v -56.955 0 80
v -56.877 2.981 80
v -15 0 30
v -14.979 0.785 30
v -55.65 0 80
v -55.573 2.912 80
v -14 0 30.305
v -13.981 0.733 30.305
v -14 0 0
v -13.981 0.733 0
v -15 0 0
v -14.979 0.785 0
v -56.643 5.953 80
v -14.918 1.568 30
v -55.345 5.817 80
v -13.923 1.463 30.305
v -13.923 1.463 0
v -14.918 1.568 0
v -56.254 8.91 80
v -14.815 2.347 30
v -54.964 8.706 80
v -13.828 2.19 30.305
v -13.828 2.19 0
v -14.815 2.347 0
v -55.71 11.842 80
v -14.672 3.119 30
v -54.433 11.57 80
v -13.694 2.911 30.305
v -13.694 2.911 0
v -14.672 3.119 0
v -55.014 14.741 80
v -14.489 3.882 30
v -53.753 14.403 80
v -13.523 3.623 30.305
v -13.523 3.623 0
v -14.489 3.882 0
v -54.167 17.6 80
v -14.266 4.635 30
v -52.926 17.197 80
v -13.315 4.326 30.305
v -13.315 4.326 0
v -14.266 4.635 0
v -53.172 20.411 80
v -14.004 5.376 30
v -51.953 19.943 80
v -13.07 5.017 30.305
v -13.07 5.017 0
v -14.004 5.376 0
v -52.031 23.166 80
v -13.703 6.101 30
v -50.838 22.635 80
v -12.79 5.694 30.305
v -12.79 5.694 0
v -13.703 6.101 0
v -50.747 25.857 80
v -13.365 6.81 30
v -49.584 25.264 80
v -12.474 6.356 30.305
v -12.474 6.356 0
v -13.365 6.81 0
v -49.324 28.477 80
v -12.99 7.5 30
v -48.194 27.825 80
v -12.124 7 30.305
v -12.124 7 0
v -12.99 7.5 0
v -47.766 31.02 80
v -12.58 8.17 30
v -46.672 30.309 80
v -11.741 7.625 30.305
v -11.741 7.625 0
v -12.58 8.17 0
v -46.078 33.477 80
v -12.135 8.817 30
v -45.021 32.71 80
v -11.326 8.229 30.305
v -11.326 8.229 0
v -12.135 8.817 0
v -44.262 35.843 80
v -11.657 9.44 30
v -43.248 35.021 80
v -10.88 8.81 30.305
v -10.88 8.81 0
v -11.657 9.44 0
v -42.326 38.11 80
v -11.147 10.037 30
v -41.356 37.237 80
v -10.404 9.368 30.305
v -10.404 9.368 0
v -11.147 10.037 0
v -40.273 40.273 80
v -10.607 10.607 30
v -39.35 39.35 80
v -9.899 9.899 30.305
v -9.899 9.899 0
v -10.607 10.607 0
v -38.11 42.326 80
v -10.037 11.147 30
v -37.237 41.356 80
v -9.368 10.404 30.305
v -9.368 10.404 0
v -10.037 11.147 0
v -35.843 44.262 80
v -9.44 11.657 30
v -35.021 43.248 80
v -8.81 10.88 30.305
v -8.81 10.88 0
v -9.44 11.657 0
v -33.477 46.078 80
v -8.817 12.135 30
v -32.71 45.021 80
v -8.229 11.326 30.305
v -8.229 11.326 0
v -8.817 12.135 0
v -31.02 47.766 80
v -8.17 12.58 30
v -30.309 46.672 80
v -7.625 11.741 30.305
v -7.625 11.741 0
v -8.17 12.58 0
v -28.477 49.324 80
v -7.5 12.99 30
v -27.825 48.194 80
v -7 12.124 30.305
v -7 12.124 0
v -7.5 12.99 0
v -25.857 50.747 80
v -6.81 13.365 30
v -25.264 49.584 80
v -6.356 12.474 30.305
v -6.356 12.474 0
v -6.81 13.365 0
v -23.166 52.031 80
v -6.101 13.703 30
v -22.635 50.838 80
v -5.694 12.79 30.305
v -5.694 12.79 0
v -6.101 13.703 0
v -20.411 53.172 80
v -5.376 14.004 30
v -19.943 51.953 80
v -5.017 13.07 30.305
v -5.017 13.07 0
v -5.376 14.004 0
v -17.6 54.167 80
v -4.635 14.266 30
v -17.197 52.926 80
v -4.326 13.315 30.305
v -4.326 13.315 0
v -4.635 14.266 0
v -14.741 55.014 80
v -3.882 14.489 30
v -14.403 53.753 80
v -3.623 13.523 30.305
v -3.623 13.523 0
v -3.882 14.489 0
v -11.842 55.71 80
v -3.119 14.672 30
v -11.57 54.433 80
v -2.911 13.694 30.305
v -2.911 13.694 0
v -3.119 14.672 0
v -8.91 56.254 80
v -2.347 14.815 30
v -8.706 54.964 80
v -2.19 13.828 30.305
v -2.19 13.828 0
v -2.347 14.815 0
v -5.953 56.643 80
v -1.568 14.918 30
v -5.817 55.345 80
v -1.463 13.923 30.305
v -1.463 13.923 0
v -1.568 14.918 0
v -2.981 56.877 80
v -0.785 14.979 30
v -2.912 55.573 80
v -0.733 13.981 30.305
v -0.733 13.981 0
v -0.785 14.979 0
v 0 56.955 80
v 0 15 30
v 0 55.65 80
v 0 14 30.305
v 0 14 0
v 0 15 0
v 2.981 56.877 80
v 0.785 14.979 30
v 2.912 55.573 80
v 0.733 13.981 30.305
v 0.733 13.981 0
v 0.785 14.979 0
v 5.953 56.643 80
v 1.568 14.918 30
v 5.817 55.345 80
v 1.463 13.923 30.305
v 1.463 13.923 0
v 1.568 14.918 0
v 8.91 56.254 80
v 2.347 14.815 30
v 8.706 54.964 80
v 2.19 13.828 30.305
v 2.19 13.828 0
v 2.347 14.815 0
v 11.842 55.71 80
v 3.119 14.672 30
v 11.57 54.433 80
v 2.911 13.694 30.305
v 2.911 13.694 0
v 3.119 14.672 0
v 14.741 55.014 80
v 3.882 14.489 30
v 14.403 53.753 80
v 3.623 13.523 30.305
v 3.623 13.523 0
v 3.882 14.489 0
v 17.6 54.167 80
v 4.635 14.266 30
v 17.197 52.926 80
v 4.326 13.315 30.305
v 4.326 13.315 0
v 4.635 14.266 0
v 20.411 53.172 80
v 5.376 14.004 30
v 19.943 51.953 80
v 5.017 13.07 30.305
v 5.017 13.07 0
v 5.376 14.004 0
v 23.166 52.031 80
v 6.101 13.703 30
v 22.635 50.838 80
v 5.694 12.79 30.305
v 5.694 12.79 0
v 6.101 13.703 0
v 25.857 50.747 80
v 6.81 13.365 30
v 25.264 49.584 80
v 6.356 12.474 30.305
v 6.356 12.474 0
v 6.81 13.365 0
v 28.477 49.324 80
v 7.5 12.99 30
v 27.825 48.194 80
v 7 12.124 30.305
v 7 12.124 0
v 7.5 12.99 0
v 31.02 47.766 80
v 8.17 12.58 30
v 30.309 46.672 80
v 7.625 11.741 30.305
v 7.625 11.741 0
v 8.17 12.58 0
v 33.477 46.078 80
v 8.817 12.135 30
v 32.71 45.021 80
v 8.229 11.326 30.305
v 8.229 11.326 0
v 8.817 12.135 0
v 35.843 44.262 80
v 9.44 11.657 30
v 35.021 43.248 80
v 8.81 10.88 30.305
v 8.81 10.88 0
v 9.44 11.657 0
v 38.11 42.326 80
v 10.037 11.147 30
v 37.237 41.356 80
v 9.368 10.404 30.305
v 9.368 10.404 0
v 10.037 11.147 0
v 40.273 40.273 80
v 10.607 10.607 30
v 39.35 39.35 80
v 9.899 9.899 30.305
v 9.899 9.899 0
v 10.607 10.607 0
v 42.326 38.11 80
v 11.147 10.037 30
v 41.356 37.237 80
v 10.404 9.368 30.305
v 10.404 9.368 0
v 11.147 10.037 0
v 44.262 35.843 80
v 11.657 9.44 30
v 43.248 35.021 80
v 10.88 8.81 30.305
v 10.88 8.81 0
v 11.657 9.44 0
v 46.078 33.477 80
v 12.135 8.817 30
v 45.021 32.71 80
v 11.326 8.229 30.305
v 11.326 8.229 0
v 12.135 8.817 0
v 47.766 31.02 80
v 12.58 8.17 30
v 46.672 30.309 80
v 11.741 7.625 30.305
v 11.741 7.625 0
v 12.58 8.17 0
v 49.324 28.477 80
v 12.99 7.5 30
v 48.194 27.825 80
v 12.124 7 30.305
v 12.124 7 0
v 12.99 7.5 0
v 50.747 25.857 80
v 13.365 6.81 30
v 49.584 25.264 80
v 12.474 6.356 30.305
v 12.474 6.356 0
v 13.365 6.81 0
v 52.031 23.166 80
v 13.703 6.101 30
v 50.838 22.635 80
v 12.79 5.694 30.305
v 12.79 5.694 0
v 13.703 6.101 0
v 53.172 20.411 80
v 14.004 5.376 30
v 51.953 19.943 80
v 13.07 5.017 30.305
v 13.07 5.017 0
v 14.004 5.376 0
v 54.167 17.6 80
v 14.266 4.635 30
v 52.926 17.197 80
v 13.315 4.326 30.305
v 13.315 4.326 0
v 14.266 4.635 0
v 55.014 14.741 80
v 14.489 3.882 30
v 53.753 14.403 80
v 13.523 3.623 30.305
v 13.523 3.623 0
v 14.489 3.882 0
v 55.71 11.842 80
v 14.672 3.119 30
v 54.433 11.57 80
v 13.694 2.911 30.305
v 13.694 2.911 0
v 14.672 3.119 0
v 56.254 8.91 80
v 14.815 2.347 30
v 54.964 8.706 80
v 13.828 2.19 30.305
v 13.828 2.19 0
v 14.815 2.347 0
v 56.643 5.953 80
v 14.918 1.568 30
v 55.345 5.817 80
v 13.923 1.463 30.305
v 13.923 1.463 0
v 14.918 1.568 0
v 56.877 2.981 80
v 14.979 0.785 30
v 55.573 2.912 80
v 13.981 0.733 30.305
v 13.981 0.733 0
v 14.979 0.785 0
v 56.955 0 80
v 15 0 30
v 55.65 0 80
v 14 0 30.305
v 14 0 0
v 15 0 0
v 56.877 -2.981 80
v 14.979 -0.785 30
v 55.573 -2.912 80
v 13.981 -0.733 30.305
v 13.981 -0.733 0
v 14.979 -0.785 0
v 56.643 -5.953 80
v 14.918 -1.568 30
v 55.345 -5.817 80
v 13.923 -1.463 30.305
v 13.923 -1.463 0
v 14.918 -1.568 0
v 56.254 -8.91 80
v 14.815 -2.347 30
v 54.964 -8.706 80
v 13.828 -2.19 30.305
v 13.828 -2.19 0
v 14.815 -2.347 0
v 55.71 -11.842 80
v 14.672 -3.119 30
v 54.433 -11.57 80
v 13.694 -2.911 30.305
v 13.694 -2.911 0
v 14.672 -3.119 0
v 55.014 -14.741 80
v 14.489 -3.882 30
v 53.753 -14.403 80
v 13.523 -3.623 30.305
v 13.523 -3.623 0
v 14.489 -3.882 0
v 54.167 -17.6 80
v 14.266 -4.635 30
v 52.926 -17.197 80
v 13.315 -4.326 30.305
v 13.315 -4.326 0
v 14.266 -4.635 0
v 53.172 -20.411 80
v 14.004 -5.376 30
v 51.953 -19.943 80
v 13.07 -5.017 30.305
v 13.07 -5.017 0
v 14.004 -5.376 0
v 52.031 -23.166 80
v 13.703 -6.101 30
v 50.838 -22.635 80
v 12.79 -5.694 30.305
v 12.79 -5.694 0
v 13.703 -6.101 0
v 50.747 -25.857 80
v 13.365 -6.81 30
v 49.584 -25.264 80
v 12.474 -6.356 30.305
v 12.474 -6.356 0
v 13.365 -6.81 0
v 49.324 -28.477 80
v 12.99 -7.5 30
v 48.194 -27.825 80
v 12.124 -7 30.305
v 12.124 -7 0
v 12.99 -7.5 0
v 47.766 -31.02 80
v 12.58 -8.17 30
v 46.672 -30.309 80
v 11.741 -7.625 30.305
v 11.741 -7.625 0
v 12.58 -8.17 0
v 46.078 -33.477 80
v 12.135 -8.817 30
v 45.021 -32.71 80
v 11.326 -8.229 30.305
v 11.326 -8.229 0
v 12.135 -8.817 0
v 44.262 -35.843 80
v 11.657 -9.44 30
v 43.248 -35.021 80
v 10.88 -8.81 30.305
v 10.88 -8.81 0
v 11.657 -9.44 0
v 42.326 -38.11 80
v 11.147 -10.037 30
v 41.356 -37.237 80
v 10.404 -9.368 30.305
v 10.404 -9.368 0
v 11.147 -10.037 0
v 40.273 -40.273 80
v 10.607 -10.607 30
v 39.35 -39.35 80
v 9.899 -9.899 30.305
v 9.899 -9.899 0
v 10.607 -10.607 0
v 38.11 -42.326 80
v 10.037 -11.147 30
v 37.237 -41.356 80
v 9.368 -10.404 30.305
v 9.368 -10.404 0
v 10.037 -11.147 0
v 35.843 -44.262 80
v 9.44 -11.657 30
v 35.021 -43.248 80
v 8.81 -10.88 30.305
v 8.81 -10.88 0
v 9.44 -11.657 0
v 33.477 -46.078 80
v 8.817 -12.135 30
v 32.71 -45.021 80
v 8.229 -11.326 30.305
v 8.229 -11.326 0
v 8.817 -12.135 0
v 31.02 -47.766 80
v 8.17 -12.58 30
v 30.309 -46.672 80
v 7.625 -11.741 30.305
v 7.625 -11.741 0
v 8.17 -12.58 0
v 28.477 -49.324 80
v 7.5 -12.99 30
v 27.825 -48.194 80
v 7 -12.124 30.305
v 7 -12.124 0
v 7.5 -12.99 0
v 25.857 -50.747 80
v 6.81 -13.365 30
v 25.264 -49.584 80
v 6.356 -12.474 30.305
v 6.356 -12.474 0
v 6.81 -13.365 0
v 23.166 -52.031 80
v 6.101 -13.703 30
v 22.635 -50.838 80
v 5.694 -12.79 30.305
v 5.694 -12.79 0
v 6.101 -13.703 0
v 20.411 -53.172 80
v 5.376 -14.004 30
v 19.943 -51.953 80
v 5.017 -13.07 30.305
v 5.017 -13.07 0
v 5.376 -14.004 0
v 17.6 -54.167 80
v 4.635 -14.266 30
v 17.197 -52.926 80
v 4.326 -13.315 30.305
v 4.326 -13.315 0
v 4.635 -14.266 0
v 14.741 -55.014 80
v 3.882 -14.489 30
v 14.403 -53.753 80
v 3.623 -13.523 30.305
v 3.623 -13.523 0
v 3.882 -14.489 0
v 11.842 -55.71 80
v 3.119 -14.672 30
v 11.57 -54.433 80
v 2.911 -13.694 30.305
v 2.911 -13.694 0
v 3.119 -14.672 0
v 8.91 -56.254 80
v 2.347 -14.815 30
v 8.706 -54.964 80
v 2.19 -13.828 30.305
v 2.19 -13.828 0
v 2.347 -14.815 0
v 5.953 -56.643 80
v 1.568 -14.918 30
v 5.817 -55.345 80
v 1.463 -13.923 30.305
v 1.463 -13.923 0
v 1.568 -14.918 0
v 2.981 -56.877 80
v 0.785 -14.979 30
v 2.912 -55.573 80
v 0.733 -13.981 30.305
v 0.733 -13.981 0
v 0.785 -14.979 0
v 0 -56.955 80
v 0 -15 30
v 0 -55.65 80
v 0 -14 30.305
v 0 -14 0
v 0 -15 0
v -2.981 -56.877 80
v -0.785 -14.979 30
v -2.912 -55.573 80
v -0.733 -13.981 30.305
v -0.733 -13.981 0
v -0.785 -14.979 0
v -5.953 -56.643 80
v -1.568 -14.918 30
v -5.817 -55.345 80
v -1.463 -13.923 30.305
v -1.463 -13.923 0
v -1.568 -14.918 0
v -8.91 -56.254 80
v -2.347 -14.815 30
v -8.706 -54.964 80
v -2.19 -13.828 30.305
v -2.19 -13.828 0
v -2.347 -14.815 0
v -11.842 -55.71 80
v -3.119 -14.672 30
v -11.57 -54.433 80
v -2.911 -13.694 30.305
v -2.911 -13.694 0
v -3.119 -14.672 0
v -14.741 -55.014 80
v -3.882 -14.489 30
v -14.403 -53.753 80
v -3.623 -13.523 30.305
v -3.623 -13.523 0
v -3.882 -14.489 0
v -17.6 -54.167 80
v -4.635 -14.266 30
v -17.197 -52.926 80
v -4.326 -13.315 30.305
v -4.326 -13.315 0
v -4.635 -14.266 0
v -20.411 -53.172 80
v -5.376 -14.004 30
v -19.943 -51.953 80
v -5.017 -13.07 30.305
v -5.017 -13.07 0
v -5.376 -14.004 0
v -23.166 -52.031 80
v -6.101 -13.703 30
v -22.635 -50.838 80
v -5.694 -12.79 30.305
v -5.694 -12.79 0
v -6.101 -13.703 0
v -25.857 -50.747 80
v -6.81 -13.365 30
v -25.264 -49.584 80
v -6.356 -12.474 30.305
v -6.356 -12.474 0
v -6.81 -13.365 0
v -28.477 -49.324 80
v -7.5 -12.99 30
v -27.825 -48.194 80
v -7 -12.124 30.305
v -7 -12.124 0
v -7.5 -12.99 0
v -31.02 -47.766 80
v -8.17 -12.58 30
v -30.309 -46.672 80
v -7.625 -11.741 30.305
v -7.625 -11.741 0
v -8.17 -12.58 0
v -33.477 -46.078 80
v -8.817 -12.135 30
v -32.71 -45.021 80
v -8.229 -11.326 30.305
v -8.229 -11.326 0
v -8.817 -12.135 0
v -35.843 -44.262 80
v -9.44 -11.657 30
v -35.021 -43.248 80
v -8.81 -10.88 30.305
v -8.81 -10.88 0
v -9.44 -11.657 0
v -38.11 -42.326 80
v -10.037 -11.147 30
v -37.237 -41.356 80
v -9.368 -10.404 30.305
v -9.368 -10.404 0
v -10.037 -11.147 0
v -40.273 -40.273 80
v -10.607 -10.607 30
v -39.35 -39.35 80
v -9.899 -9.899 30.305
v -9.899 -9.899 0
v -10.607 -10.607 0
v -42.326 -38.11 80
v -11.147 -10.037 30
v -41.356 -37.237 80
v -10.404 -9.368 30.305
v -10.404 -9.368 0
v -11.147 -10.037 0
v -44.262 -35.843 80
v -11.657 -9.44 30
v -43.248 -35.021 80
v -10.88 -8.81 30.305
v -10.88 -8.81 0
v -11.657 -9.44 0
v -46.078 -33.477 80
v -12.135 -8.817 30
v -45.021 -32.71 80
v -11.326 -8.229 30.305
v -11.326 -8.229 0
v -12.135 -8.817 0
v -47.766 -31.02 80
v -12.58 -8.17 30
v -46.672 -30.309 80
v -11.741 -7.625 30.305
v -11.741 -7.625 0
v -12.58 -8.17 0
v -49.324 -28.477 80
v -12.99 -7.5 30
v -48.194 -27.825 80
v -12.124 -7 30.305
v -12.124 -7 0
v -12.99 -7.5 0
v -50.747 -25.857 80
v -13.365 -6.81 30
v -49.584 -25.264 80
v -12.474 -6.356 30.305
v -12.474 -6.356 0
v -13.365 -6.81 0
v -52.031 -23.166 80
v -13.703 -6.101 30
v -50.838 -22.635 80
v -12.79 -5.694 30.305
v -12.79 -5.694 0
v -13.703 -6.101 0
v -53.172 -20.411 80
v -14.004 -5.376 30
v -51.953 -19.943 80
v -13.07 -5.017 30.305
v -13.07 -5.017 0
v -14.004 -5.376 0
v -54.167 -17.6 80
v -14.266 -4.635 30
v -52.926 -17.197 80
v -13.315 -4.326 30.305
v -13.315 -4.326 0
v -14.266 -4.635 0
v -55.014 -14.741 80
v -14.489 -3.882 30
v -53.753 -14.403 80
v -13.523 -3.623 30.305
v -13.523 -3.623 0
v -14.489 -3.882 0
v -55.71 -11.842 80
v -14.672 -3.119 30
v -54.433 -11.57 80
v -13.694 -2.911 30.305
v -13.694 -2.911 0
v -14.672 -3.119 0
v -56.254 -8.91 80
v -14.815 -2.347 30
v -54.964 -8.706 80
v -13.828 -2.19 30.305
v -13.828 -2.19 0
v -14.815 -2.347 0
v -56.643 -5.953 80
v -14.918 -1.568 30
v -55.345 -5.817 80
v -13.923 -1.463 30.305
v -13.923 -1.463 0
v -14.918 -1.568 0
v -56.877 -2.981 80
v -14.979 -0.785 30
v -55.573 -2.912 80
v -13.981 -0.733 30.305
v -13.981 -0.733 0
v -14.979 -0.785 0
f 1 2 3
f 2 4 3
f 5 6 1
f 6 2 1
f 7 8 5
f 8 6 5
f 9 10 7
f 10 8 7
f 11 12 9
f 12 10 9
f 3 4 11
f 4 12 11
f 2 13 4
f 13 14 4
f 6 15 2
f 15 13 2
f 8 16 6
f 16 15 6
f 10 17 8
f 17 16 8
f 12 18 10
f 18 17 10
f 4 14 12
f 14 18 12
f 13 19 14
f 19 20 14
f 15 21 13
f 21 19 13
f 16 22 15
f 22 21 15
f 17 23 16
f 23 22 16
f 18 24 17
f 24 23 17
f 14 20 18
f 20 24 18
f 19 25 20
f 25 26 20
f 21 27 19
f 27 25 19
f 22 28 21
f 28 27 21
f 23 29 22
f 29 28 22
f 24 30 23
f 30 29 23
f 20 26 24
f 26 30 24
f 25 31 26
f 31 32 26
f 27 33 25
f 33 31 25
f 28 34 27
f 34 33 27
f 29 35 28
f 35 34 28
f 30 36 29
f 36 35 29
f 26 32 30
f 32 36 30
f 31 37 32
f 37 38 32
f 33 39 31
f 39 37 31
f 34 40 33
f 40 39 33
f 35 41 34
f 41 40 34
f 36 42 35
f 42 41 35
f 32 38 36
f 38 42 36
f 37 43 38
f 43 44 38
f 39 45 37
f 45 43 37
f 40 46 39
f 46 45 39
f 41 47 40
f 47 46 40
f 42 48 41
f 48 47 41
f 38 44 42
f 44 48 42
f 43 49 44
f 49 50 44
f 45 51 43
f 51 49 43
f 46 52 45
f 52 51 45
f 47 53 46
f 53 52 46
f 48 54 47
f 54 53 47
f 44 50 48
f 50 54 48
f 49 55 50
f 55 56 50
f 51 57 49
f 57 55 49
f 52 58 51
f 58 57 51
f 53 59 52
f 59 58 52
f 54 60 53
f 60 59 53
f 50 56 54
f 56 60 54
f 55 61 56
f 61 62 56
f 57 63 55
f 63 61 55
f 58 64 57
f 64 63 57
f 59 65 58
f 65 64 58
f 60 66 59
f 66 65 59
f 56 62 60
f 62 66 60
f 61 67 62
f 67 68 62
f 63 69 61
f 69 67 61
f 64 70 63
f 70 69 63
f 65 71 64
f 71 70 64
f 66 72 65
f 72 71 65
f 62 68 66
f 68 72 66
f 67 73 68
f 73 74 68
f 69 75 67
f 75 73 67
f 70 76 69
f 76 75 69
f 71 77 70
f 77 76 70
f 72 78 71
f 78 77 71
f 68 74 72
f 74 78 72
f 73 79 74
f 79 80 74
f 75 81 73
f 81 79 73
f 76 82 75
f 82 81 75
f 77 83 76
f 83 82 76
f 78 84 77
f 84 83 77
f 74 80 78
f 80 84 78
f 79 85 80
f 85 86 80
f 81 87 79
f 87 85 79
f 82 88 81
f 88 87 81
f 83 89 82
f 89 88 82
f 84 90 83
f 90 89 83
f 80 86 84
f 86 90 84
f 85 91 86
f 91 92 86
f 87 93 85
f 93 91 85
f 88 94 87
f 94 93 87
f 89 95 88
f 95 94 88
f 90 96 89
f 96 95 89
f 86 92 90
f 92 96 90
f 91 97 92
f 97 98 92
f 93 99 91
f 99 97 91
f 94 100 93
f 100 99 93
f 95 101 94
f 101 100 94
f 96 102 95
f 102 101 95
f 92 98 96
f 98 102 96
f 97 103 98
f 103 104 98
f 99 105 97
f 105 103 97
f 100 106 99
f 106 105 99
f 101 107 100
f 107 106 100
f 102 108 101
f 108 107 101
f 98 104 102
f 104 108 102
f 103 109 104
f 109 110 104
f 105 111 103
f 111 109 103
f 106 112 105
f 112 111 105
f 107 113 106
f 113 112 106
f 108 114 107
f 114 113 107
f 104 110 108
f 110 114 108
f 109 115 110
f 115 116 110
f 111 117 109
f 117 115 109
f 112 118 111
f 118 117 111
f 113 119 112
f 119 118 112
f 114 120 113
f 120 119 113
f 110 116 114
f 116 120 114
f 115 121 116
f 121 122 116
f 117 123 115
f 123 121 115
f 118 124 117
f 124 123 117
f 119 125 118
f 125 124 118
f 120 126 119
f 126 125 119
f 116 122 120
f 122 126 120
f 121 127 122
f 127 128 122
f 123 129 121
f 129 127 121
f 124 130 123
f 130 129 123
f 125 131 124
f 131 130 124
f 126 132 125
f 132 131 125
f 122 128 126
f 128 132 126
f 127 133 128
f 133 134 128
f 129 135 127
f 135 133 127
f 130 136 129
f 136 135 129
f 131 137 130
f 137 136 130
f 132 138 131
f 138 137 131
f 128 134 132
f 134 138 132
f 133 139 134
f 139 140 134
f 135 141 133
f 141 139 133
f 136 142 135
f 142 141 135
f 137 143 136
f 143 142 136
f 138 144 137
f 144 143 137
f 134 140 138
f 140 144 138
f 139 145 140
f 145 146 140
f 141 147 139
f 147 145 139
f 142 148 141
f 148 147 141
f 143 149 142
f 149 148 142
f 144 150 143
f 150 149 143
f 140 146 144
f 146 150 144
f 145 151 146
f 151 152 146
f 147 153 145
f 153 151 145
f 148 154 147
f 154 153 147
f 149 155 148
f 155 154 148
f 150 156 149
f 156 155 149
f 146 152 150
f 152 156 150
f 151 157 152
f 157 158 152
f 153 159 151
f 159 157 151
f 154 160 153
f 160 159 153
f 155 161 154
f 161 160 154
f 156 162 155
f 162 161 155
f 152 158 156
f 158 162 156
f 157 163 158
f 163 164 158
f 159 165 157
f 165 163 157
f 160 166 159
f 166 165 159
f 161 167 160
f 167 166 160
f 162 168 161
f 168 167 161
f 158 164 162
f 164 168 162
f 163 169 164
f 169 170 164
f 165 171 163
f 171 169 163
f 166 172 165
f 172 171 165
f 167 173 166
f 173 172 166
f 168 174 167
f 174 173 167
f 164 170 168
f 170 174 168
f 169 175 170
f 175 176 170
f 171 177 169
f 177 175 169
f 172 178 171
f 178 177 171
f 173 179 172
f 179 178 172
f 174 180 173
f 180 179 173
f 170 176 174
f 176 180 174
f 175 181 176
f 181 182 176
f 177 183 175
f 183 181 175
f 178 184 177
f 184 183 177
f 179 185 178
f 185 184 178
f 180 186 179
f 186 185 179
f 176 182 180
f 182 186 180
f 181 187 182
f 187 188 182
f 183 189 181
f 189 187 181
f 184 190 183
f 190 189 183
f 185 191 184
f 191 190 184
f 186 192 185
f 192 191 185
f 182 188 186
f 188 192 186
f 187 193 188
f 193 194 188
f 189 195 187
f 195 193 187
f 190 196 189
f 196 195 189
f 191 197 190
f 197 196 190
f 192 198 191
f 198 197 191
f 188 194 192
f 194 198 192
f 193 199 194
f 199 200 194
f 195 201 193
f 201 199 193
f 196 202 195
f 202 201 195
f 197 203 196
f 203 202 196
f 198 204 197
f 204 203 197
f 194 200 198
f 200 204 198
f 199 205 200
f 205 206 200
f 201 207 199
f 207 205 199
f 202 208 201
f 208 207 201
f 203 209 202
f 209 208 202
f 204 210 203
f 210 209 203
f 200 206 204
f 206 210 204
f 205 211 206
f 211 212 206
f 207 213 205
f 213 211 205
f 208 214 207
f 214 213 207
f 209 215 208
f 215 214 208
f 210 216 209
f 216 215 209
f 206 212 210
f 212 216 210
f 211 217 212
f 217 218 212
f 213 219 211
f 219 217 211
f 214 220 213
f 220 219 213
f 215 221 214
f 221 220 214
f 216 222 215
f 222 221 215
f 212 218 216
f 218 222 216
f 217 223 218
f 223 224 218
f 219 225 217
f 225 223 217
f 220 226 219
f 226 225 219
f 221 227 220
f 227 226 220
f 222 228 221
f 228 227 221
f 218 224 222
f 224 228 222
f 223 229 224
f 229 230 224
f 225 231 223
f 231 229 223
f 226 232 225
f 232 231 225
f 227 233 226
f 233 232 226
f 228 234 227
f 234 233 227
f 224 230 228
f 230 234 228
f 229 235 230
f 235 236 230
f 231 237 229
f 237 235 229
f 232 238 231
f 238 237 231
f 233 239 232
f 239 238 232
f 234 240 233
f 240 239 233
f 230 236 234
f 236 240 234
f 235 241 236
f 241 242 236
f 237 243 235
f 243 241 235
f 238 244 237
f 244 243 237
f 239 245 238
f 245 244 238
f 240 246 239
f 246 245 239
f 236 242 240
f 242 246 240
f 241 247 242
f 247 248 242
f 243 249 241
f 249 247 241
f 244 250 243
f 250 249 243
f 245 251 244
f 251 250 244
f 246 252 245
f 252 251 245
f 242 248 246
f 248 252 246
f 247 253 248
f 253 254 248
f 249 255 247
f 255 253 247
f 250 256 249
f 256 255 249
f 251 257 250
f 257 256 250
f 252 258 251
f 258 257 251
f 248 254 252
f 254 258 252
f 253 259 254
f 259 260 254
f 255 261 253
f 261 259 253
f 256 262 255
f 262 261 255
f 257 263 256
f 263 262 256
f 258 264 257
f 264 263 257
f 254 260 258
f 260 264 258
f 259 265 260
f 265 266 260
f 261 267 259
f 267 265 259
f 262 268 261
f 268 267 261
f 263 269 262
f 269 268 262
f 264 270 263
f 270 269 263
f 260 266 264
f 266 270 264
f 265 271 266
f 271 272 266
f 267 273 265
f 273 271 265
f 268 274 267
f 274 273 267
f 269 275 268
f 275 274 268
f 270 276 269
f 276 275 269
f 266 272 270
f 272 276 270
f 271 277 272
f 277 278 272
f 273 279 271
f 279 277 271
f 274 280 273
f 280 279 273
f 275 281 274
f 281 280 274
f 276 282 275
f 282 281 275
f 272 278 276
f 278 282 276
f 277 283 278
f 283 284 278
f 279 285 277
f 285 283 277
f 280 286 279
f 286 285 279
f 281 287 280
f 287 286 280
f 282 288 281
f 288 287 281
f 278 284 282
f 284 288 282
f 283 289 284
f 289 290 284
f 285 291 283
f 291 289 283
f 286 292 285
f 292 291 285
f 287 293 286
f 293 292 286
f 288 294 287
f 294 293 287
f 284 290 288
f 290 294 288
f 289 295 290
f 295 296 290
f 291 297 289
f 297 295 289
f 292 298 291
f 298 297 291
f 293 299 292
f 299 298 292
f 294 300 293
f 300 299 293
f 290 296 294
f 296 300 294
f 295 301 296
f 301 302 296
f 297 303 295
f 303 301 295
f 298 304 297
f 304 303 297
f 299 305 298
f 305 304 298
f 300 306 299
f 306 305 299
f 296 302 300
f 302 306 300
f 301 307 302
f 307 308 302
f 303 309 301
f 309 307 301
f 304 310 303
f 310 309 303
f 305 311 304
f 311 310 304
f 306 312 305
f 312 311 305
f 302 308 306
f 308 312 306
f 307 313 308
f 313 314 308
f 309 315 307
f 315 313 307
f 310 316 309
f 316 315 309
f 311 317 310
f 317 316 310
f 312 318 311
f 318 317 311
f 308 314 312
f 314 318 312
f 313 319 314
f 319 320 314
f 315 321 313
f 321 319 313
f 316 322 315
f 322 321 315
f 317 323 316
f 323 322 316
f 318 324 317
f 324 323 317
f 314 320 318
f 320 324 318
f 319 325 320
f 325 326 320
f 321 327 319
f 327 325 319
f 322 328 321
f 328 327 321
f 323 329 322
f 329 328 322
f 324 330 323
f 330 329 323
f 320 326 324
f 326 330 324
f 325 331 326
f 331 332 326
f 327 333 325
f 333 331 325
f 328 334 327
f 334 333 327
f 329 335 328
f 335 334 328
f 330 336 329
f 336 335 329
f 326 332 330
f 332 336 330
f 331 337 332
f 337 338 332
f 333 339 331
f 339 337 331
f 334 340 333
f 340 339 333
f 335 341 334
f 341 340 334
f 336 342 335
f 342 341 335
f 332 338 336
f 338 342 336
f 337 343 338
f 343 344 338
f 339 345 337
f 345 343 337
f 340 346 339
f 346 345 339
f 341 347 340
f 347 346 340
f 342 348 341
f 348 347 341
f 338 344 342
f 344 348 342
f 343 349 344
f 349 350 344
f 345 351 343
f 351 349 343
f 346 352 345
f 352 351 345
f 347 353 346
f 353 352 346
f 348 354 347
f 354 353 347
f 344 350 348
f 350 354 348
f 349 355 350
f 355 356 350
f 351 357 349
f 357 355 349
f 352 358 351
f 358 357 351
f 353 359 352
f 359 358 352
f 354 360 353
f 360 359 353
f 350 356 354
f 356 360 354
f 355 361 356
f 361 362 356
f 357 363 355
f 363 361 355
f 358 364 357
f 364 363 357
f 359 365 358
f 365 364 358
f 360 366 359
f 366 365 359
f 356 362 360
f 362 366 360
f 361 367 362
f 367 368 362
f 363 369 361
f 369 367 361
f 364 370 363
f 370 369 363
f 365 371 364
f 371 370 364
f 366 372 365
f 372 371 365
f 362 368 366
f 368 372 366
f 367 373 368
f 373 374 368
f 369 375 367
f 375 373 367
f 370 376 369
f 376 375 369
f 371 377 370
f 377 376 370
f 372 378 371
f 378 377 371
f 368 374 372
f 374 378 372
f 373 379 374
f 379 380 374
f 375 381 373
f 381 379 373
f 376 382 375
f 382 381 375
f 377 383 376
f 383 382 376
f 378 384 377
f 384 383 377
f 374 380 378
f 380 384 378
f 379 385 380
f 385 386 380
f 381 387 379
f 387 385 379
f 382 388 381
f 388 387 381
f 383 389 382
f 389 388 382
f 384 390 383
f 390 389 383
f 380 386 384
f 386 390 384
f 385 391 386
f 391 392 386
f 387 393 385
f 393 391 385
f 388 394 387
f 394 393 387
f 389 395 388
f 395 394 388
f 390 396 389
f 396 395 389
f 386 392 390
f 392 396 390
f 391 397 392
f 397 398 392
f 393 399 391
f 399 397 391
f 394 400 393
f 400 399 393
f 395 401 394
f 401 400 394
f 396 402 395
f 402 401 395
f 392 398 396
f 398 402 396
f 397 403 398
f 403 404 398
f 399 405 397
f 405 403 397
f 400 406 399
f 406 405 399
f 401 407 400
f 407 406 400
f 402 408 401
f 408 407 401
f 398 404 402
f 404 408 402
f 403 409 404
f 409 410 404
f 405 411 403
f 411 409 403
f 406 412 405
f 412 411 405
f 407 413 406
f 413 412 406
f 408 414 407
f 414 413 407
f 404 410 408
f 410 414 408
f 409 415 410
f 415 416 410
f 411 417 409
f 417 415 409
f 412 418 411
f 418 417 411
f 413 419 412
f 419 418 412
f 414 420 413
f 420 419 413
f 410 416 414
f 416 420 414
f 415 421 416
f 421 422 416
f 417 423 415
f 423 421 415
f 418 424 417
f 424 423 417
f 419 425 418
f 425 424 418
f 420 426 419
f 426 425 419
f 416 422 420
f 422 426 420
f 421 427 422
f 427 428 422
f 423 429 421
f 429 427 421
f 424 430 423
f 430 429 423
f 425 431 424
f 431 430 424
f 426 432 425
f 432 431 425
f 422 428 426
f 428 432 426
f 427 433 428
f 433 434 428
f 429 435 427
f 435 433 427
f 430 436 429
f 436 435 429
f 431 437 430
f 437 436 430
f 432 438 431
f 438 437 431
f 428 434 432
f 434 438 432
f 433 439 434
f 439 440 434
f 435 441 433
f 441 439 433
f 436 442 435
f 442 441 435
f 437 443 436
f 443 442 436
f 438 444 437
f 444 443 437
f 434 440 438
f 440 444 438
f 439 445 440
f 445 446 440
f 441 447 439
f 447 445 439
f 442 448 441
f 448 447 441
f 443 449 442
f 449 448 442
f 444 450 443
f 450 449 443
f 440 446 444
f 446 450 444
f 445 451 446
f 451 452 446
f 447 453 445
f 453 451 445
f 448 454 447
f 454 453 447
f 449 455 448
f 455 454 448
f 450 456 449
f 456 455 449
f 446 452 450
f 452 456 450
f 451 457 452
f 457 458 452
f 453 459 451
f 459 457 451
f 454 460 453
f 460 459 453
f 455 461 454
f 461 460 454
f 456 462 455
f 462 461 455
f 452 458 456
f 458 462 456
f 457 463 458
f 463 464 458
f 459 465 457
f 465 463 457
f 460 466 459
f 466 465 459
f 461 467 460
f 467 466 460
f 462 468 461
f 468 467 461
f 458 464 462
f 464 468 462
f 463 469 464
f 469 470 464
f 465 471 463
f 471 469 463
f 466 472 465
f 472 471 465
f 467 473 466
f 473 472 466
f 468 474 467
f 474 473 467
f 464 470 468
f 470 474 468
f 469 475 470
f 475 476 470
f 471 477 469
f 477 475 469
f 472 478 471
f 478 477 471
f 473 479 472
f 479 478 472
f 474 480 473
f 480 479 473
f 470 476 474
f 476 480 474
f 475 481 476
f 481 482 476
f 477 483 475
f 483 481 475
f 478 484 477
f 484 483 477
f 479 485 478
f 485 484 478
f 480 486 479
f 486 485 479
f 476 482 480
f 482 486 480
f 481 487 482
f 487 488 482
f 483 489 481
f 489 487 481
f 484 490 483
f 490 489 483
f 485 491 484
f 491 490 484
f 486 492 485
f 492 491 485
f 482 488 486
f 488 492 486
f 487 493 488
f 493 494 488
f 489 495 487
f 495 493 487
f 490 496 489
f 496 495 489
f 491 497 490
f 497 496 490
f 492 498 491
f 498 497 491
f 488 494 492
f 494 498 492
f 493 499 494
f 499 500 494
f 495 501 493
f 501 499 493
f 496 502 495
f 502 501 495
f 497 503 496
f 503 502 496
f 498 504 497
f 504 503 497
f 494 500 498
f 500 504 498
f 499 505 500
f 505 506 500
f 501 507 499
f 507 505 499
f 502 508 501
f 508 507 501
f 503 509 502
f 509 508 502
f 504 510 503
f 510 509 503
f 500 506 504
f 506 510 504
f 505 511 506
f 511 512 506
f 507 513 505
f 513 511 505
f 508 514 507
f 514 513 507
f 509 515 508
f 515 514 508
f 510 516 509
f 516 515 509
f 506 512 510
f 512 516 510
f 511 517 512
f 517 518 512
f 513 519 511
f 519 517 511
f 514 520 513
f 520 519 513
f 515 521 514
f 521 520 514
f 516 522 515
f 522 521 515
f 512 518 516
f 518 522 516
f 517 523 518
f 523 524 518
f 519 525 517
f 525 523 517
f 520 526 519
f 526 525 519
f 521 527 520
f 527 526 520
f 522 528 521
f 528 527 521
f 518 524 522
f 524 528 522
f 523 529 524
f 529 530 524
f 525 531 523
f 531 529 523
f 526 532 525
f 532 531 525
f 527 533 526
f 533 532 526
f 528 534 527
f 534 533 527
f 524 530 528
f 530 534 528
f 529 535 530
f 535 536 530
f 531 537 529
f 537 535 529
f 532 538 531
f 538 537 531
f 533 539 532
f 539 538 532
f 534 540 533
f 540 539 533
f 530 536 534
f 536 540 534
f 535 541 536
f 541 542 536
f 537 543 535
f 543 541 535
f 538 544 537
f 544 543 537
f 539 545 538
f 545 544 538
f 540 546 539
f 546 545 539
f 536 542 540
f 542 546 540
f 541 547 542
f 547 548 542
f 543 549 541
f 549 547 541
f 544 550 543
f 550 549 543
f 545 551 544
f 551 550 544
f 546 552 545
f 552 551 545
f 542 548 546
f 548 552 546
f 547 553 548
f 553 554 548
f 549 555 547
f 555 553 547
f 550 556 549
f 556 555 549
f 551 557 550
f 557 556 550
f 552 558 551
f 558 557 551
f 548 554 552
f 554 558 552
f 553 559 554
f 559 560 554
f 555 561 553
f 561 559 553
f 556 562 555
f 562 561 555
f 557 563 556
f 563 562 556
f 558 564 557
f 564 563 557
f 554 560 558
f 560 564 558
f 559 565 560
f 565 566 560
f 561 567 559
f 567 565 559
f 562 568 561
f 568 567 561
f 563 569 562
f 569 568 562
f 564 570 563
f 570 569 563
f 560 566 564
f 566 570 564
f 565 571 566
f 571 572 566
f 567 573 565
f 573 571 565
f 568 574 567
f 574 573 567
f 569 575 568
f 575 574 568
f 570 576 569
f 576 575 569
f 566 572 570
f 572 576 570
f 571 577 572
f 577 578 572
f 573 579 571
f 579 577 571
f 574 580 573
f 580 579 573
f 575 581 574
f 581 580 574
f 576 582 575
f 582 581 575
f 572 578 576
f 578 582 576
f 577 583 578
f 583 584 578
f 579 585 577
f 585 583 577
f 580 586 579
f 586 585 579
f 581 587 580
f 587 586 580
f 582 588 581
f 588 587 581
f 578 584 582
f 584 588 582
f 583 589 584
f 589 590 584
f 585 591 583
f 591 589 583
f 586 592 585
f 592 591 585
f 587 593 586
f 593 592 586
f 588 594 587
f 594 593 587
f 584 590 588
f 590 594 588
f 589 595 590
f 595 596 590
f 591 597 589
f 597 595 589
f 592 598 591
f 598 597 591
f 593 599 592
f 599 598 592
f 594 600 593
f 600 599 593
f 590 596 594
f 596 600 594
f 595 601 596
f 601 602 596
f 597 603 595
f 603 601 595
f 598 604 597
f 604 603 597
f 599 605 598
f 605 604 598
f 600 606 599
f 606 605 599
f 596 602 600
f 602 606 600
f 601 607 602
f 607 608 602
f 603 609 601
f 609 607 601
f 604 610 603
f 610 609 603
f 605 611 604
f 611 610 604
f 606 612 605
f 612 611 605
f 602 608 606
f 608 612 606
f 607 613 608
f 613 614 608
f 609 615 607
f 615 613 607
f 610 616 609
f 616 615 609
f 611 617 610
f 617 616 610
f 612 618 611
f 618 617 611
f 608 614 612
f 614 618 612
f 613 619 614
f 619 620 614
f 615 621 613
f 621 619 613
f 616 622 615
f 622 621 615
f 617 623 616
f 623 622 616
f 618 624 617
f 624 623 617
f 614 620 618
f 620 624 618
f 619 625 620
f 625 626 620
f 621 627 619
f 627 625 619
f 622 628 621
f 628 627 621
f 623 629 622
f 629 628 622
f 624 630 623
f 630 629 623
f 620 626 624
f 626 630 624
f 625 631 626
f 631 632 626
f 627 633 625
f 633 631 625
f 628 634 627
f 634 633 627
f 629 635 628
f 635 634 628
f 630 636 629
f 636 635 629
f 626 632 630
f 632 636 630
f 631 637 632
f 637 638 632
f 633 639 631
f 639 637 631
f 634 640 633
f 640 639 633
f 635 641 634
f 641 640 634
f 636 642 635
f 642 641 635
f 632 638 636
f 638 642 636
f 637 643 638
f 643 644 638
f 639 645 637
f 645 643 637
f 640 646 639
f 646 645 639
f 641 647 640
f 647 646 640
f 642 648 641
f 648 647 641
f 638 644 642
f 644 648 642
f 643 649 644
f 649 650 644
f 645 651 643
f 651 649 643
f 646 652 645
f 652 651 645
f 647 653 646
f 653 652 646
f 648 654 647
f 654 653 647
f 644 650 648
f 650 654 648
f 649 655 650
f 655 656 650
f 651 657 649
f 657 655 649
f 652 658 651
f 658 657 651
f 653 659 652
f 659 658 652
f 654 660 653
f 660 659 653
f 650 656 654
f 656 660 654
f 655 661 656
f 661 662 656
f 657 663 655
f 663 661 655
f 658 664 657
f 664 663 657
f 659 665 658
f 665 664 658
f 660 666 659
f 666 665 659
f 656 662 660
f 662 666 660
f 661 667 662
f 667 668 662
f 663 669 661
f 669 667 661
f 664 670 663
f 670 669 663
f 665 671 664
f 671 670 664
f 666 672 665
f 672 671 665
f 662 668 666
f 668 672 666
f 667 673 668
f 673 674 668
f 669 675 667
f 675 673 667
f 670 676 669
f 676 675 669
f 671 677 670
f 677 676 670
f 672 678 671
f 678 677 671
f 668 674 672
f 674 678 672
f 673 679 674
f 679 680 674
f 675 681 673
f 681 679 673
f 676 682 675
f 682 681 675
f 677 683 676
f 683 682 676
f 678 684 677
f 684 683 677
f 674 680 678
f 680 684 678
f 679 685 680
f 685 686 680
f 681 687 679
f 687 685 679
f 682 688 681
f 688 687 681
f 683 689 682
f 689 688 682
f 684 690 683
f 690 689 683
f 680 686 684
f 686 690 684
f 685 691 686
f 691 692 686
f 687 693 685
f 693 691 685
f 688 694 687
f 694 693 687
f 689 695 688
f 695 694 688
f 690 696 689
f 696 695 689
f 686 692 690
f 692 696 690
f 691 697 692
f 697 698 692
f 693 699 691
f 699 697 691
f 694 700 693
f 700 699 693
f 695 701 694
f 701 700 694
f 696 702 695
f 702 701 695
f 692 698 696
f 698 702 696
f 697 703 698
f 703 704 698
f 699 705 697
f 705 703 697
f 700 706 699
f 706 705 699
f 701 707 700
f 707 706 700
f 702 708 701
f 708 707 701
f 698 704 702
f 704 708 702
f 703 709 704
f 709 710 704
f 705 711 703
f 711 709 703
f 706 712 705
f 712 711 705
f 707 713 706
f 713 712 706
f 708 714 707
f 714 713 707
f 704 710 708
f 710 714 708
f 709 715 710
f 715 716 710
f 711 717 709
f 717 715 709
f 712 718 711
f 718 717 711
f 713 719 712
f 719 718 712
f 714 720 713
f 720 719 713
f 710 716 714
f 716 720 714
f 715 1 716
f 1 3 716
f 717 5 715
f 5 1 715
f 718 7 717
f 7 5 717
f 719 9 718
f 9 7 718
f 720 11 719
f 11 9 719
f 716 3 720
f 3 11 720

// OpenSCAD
hc=50; // cone surpluss height
ac=50; // cone angle from x-axis / ccw
xc=hc/tan(ac); //cone width

dt=30; // tube outer diameter
lt=30; // tube length

tw=1; // wall thickness
xw=tw/sin(ac); // cone wall x-dir thickness

echo(str("Cone Diameter = ",dt+2*xc));
echo(str("Funnel Height = ",lt+hc));

rotate_extrude(angle = 360, convexity = 2, $fn = 120)
{
    polygon([
        [dt/2-tw   ,       0],
        [dt/2      ,       0],
        [dt/2      ,lt      ],
        [dt/2+xc   ,lt   +hc],
        [dt/2+xc-xw,lt   +hc],
        [dt/2-tw   ,lt+xw-tw]],
        paths=[[0,1,2,3,4,5]]);
};
